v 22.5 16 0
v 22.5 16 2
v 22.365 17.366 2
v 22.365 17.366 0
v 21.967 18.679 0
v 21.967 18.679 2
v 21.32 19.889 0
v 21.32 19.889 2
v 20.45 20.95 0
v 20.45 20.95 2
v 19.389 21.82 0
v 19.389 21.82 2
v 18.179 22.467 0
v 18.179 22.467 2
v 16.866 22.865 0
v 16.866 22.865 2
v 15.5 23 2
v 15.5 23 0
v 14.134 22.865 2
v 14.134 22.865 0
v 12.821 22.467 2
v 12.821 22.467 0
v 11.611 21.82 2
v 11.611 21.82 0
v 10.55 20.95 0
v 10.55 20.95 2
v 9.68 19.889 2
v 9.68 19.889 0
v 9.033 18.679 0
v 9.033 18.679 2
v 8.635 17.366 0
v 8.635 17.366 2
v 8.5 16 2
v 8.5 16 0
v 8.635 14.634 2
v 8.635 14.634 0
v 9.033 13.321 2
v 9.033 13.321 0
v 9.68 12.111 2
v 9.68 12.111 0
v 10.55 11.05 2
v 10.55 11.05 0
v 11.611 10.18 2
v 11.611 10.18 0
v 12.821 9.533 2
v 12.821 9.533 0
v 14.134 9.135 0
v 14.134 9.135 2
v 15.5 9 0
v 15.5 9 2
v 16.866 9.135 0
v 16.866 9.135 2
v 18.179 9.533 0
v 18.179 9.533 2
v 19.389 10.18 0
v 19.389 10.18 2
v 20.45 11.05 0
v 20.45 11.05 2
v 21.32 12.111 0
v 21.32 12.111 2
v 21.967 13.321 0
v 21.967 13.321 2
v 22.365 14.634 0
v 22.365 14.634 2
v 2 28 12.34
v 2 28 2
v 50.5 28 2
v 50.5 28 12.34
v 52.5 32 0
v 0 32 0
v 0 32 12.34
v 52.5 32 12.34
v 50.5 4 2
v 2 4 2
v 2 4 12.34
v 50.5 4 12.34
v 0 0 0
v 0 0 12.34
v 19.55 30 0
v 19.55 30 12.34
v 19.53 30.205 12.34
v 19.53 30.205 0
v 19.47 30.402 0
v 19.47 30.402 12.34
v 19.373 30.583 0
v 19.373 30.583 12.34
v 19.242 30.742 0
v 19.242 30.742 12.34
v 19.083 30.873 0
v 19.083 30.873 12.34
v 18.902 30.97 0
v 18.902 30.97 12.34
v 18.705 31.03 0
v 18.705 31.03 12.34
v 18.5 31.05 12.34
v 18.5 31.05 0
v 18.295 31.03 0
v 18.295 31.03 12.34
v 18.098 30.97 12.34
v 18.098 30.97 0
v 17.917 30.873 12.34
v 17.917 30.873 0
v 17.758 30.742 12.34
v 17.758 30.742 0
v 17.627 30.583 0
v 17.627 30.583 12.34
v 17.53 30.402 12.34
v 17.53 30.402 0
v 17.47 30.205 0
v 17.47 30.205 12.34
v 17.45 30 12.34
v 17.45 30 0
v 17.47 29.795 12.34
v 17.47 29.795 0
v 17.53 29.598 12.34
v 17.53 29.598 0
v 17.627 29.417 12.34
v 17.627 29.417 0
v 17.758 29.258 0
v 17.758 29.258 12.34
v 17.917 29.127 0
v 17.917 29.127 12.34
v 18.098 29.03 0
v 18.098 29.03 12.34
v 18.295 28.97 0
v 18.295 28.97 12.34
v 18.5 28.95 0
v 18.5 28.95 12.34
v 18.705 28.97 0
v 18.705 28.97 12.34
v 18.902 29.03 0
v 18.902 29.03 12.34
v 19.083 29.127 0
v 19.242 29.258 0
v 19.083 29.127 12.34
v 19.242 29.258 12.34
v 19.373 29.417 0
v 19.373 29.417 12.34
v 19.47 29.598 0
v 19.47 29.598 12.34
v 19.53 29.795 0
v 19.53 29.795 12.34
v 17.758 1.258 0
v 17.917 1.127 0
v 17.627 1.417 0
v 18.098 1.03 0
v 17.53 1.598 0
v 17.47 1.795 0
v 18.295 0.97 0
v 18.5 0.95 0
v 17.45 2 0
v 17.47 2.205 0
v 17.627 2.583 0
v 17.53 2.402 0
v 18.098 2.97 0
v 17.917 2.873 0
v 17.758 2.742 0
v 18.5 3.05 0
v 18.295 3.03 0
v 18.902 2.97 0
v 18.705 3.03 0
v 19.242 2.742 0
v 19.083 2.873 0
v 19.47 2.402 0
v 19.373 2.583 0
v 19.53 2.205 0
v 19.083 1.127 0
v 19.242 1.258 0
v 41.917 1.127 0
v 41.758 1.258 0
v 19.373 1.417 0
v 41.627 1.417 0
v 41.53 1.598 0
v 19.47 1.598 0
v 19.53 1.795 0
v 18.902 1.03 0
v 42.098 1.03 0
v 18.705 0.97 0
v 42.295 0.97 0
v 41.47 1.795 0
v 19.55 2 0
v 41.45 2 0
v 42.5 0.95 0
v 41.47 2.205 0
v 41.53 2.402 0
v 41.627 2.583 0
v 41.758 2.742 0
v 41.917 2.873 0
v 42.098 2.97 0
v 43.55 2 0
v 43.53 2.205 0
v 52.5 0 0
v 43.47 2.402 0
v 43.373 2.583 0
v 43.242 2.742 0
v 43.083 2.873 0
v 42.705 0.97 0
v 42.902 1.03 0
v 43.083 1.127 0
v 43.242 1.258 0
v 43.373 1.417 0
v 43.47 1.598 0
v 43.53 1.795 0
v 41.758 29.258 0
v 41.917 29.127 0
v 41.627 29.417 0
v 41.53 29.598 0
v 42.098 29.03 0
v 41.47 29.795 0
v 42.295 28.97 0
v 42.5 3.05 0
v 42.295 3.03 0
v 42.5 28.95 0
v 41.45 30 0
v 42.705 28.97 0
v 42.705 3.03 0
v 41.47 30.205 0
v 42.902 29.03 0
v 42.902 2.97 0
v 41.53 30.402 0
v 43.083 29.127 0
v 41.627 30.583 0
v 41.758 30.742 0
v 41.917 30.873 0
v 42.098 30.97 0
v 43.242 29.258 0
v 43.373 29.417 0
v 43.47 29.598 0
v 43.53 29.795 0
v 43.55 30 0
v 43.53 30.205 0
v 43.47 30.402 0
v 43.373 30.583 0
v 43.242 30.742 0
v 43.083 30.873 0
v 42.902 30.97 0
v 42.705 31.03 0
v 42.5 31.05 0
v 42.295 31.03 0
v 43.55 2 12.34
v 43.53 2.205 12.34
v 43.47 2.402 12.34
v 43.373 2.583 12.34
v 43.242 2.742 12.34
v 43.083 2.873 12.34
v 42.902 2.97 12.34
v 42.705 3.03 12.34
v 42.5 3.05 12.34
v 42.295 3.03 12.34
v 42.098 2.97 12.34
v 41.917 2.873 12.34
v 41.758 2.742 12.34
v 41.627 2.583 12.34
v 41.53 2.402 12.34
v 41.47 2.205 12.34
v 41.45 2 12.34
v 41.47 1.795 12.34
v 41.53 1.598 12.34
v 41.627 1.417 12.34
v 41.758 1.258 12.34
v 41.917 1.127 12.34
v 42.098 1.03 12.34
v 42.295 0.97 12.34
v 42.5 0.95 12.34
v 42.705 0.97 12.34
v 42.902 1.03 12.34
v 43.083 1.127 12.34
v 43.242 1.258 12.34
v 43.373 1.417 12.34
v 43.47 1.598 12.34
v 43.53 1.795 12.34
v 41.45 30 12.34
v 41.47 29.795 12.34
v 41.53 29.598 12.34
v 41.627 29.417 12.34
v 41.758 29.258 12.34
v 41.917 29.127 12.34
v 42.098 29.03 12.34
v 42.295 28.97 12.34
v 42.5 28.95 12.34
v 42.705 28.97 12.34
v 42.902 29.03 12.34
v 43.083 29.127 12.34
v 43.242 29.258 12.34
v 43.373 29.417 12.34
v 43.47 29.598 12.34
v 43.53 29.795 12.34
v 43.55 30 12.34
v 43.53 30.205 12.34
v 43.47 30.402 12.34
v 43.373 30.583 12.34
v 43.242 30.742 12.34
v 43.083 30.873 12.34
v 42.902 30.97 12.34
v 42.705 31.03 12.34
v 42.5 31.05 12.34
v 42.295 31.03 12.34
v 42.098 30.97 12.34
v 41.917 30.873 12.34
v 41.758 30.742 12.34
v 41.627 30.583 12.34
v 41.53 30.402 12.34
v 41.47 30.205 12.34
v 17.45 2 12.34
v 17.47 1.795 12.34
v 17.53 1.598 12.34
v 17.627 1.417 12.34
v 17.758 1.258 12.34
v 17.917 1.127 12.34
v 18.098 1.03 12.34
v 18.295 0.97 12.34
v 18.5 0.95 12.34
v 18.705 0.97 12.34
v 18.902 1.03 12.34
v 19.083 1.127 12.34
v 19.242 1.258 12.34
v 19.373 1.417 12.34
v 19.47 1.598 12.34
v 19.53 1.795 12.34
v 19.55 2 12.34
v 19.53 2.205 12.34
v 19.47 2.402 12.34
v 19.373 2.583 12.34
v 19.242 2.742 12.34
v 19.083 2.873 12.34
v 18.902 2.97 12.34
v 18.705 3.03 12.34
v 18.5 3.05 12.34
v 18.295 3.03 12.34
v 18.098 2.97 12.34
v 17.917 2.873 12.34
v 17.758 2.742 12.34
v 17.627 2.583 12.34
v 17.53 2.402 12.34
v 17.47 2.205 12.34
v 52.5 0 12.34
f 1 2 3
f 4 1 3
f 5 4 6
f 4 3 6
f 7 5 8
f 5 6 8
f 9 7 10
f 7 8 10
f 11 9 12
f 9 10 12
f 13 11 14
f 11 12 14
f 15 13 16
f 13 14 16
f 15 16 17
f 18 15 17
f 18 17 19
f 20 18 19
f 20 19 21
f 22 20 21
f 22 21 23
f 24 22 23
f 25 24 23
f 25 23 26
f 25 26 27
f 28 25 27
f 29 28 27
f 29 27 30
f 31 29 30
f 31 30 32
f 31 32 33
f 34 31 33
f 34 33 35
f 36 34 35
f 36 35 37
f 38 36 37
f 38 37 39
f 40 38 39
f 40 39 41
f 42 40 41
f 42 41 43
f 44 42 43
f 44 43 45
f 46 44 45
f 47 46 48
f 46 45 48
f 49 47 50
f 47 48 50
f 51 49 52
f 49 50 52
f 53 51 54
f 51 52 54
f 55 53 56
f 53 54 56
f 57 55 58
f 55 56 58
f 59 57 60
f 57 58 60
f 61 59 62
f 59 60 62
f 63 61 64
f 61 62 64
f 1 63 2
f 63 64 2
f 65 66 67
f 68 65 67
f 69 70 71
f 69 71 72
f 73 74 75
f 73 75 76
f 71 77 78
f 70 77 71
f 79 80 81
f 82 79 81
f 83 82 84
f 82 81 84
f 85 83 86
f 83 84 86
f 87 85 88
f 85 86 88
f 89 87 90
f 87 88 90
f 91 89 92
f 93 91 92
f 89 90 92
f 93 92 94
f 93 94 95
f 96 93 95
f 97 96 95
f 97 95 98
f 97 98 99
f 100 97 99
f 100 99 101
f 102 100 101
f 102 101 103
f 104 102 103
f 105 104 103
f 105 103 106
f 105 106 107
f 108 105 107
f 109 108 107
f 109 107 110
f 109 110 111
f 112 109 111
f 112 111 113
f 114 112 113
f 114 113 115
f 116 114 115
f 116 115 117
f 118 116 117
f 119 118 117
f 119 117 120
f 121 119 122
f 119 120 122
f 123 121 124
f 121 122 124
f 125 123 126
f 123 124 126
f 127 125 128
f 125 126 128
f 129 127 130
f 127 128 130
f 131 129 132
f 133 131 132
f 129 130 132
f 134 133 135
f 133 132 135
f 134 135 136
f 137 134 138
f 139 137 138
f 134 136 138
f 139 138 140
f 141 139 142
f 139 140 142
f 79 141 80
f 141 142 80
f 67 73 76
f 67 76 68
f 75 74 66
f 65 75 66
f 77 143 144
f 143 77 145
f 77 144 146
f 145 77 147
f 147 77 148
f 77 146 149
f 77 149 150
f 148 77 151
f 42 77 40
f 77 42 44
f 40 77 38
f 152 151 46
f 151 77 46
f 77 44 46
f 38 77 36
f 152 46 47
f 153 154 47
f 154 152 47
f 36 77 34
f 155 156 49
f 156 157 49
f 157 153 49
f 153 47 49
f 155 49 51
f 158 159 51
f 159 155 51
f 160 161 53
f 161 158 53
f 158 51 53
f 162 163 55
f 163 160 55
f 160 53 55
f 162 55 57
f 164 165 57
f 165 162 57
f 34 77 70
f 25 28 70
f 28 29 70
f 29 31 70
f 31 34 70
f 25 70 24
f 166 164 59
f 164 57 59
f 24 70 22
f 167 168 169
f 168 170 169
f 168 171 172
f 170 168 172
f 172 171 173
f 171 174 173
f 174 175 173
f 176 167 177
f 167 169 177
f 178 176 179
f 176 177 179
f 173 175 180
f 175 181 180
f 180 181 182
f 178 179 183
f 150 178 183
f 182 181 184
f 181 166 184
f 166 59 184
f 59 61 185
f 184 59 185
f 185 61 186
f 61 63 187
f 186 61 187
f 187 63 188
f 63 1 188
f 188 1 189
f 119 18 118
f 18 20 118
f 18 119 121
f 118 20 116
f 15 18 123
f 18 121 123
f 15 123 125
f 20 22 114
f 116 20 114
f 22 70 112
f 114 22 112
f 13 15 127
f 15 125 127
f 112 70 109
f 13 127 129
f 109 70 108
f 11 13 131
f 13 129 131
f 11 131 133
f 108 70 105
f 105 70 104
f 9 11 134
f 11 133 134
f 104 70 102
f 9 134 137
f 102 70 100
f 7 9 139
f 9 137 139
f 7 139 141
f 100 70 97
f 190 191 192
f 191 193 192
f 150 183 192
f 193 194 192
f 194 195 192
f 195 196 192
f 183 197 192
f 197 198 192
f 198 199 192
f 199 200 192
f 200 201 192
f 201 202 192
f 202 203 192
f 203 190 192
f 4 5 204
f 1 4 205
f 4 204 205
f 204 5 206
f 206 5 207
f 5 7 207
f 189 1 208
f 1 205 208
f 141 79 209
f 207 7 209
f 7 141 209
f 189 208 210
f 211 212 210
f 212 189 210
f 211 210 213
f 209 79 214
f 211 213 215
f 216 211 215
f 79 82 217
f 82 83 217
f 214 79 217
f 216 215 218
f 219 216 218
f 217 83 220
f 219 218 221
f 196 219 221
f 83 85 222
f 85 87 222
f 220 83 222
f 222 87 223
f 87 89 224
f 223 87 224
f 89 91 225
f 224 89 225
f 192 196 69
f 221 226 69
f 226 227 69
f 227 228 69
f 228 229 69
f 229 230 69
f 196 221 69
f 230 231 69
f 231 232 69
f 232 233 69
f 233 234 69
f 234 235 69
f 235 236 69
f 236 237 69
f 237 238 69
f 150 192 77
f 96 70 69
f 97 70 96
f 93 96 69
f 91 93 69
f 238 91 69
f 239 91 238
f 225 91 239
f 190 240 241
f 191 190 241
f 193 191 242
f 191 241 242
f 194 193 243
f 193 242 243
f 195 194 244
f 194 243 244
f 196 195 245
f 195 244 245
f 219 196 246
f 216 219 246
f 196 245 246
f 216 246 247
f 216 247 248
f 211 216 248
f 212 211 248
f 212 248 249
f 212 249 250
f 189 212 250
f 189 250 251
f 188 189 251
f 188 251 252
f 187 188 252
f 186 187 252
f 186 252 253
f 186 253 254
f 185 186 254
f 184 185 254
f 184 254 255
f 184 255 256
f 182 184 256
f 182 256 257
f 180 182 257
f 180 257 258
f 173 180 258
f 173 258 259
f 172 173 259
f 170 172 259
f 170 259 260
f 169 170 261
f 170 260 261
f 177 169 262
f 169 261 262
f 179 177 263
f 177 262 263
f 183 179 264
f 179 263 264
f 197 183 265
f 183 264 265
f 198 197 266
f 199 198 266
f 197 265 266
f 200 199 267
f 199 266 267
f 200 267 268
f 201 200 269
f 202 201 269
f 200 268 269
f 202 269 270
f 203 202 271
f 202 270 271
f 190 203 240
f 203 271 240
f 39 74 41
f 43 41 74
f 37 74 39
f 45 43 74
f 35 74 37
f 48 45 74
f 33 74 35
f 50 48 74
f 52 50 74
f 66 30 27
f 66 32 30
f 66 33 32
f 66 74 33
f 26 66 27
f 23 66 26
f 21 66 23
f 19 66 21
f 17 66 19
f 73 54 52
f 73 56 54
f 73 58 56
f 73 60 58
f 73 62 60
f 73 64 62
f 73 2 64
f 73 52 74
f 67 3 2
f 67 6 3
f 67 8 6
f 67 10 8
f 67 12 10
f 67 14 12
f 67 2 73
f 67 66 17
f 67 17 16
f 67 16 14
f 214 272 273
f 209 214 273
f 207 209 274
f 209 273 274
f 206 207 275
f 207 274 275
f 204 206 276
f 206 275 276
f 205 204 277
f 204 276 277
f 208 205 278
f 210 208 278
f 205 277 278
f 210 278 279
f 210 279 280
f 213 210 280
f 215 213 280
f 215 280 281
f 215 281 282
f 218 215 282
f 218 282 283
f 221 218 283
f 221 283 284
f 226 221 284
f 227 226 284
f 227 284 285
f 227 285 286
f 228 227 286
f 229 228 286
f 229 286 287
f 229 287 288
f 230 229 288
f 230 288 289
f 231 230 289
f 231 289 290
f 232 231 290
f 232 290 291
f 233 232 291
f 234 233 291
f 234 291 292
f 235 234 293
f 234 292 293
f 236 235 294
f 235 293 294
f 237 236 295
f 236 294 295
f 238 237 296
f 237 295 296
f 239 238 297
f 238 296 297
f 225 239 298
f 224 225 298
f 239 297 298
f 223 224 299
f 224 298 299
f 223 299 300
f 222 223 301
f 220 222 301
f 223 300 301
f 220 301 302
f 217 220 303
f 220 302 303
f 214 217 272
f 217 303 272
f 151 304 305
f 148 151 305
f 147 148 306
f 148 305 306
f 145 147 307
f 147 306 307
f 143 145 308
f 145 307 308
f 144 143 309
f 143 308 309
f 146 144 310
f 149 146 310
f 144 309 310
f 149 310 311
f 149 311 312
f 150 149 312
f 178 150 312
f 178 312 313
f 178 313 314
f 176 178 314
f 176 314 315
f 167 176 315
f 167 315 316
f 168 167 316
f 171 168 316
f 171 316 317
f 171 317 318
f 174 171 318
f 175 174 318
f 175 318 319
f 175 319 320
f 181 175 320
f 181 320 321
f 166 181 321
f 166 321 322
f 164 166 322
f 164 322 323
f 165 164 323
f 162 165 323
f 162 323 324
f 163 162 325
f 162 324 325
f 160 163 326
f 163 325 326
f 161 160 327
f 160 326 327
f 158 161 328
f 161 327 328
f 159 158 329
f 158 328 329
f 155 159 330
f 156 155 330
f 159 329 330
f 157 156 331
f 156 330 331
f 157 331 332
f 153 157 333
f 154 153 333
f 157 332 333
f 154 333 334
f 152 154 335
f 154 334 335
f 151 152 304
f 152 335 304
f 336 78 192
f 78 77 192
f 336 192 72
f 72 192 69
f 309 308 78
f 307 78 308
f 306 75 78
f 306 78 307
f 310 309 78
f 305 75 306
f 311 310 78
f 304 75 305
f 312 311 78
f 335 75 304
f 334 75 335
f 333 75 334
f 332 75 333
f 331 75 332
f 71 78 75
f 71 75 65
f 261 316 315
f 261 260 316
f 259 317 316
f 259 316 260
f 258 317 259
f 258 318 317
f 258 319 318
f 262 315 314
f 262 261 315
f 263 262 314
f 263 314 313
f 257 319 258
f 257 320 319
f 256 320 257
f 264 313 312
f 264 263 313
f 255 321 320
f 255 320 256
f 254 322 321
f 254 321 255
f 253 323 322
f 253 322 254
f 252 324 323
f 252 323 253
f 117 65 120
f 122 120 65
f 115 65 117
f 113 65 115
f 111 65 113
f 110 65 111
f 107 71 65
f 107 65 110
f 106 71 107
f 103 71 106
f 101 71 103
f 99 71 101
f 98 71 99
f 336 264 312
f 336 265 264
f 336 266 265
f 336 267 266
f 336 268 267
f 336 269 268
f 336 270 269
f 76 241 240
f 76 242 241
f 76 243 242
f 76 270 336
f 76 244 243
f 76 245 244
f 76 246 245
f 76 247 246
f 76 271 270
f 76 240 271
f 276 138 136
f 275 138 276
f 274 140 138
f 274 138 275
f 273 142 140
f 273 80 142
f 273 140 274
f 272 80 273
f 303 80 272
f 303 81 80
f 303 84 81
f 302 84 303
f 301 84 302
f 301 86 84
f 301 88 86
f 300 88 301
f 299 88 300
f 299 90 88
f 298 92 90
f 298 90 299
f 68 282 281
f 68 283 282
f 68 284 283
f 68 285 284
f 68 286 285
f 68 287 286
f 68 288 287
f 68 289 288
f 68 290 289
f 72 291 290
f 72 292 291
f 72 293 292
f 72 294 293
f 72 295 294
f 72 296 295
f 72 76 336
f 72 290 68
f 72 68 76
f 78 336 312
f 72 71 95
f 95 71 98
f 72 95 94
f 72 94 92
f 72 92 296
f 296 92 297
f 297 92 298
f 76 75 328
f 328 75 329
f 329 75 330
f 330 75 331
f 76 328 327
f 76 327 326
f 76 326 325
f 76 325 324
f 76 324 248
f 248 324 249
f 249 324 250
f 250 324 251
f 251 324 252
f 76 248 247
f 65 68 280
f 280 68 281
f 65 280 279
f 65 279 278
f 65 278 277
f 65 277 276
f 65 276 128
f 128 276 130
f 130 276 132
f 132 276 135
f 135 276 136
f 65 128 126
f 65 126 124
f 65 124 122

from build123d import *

# Parameters (mm, degrees)
SKETCH_1_W          = 52.5
SKETCH_1_H          = 32
EXTRUDE_1_DEPTH     = 2
SKETCH_2_W          = 52.5
SKETCH_2_H          = 32
SKETCH_2_W_2        = 48.5
SKETCH_2_H_2        = 24
EXTRUDE_2_DEPTH     = 10.34
CUT_EXTRUDE_1_REACH = 64.347
SKETCH_3_R          = 7
CUT_EXTRUDE_2_REACH = 64.71
SKETCH_4_R          = 1.05


with BuildPart() as part:
    # 草图1 → 凸台-拉伸1 (new body)
    with BuildSketch(Plane.XY):
        with Locations((26.25, 16)):
            Rectangle(SKETCH_1_W, SKETCH_1_H)
    extrude(amount=EXTRUDE_1_DEPTH)

    # 草图2 → 凸台-拉伸2 (add)
    with BuildSketch(Plane.XY.offset(2)):
        with Locations((26.25, 16)):
            Rectangle(SKETCH_2_W, SKETCH_2_H)
        with Locations((26.25, 16)):
            Rectangle(SKETCH_2_W_2, SKETCH_2_H_2, mode=Mode.SUBTRACT)
    extrude(amount=EXTRUDE_2_DEPTH)

    # 草图3 → 切除-拉伸1 (cut, up to next)
    with BuildSketch(Plane.XY.offset(2), mode=Mode.PRIVATE) as cut_extrude_1_sk1:
        with Locations((15.5, 16)):
            Circle(SKETCH_3_R)
    cut_extrude_1_tool1 = extrude(cut_extrude_1_sk1.sketch, amount=-CUT_EXTRUDE_1_REACH, mode=Mode.PRIVATE) & part.part
    add(cut_extrude_1_tool1.solids().sort_by_distance((15.5, 16, 2))[0], mode=Mode.SUBTRACT)

    # 草图4 → 切除-拉伸2 (cut, up to next)
    with BuildSketch(Plane.XY.offset(12.34), mode=Mode.PRIVATE) as cut_extrude_2_sk1:
        with Locations((18.5, 30)):
            Circle(SKETCH_4_R)
    cut_extrude_2_tool1 = extrude(cut_extrude_2_sk1.sketch, amount=-CUT_EXTRUDE_2_REACH, mode=Mode.PRIVATE) & part.part
    # 草图4 → 切除-拉伸2 (cut, up to next)
    with BuildSketch(Plane.XY.offset(12.34), mode=Mode.PRIVATE) as cut_extrude_2_sk2:
        with Locations(Location((42.5, 30, 0), (0, 0, 180))):
            Circle(SKETCH_4_R)
    cut_extrude_2_tool2 = extrude(cut_extrude_2_sk2.sketch, amount=-CUT_EXTRUDE_2_REACH, mode=Mode.PRIVATE) & part.part
    # 草图4 → 切除-拉伸2 (cut, up to next)
    with BuildSketch(Plane.XY.offset(12.34), mode=Mode.PRIVATE) as cut_extrude_2_sk3:
        with Locations((42.5, 2)):
            Circle(SKETCH_4_R)
    cut_extrude_2_tool3 = extrude(cut_extrude_2_sk3.sketch, amount=-CUT_EXTRUDE_2_REACH, mode=Mode.PRIVATE) & part.part
    # 草图4 → 切除-拉伸2 (cut, up to next)
    with BuildSketch(Plane.XY.offset(12.34), mode=Mode.PRIVATE) as cut_extrude_2_sk4:
        with Locations(Location((18.5, 2, 0), (0, 0, 180))):
            Circle(SKETCH_4_R)
    cut_extrude_2_tool4 = extrude(cut_extrude_2_sk4.sketch, amount=-CUT_EXTRUDE_2_REACH, mode=Mode.PRIVATE) & part.part
    add(cut_extrude_2_tool1.solids().sort_by_distance((18.5, 30, 12.34))[0], mode=Mode.SUBTRACT)
    add(cut_extrude_2_tool2.solids().sort_by_distance((42.5, 30, 12.34))[0], mode=Mode.SUBTRACT)
    add(cut_extrude_2_tool3.solids().sort_by_distance((42.5, 2, 12.34))[0], mode=Mode.SUBTRACT)
    add(cut_extrude_2_tool4.solids().sort_by_distance((18.5, 2, 12.34))[0], mode=Mode.SUBTRACT)


solid = part.part
